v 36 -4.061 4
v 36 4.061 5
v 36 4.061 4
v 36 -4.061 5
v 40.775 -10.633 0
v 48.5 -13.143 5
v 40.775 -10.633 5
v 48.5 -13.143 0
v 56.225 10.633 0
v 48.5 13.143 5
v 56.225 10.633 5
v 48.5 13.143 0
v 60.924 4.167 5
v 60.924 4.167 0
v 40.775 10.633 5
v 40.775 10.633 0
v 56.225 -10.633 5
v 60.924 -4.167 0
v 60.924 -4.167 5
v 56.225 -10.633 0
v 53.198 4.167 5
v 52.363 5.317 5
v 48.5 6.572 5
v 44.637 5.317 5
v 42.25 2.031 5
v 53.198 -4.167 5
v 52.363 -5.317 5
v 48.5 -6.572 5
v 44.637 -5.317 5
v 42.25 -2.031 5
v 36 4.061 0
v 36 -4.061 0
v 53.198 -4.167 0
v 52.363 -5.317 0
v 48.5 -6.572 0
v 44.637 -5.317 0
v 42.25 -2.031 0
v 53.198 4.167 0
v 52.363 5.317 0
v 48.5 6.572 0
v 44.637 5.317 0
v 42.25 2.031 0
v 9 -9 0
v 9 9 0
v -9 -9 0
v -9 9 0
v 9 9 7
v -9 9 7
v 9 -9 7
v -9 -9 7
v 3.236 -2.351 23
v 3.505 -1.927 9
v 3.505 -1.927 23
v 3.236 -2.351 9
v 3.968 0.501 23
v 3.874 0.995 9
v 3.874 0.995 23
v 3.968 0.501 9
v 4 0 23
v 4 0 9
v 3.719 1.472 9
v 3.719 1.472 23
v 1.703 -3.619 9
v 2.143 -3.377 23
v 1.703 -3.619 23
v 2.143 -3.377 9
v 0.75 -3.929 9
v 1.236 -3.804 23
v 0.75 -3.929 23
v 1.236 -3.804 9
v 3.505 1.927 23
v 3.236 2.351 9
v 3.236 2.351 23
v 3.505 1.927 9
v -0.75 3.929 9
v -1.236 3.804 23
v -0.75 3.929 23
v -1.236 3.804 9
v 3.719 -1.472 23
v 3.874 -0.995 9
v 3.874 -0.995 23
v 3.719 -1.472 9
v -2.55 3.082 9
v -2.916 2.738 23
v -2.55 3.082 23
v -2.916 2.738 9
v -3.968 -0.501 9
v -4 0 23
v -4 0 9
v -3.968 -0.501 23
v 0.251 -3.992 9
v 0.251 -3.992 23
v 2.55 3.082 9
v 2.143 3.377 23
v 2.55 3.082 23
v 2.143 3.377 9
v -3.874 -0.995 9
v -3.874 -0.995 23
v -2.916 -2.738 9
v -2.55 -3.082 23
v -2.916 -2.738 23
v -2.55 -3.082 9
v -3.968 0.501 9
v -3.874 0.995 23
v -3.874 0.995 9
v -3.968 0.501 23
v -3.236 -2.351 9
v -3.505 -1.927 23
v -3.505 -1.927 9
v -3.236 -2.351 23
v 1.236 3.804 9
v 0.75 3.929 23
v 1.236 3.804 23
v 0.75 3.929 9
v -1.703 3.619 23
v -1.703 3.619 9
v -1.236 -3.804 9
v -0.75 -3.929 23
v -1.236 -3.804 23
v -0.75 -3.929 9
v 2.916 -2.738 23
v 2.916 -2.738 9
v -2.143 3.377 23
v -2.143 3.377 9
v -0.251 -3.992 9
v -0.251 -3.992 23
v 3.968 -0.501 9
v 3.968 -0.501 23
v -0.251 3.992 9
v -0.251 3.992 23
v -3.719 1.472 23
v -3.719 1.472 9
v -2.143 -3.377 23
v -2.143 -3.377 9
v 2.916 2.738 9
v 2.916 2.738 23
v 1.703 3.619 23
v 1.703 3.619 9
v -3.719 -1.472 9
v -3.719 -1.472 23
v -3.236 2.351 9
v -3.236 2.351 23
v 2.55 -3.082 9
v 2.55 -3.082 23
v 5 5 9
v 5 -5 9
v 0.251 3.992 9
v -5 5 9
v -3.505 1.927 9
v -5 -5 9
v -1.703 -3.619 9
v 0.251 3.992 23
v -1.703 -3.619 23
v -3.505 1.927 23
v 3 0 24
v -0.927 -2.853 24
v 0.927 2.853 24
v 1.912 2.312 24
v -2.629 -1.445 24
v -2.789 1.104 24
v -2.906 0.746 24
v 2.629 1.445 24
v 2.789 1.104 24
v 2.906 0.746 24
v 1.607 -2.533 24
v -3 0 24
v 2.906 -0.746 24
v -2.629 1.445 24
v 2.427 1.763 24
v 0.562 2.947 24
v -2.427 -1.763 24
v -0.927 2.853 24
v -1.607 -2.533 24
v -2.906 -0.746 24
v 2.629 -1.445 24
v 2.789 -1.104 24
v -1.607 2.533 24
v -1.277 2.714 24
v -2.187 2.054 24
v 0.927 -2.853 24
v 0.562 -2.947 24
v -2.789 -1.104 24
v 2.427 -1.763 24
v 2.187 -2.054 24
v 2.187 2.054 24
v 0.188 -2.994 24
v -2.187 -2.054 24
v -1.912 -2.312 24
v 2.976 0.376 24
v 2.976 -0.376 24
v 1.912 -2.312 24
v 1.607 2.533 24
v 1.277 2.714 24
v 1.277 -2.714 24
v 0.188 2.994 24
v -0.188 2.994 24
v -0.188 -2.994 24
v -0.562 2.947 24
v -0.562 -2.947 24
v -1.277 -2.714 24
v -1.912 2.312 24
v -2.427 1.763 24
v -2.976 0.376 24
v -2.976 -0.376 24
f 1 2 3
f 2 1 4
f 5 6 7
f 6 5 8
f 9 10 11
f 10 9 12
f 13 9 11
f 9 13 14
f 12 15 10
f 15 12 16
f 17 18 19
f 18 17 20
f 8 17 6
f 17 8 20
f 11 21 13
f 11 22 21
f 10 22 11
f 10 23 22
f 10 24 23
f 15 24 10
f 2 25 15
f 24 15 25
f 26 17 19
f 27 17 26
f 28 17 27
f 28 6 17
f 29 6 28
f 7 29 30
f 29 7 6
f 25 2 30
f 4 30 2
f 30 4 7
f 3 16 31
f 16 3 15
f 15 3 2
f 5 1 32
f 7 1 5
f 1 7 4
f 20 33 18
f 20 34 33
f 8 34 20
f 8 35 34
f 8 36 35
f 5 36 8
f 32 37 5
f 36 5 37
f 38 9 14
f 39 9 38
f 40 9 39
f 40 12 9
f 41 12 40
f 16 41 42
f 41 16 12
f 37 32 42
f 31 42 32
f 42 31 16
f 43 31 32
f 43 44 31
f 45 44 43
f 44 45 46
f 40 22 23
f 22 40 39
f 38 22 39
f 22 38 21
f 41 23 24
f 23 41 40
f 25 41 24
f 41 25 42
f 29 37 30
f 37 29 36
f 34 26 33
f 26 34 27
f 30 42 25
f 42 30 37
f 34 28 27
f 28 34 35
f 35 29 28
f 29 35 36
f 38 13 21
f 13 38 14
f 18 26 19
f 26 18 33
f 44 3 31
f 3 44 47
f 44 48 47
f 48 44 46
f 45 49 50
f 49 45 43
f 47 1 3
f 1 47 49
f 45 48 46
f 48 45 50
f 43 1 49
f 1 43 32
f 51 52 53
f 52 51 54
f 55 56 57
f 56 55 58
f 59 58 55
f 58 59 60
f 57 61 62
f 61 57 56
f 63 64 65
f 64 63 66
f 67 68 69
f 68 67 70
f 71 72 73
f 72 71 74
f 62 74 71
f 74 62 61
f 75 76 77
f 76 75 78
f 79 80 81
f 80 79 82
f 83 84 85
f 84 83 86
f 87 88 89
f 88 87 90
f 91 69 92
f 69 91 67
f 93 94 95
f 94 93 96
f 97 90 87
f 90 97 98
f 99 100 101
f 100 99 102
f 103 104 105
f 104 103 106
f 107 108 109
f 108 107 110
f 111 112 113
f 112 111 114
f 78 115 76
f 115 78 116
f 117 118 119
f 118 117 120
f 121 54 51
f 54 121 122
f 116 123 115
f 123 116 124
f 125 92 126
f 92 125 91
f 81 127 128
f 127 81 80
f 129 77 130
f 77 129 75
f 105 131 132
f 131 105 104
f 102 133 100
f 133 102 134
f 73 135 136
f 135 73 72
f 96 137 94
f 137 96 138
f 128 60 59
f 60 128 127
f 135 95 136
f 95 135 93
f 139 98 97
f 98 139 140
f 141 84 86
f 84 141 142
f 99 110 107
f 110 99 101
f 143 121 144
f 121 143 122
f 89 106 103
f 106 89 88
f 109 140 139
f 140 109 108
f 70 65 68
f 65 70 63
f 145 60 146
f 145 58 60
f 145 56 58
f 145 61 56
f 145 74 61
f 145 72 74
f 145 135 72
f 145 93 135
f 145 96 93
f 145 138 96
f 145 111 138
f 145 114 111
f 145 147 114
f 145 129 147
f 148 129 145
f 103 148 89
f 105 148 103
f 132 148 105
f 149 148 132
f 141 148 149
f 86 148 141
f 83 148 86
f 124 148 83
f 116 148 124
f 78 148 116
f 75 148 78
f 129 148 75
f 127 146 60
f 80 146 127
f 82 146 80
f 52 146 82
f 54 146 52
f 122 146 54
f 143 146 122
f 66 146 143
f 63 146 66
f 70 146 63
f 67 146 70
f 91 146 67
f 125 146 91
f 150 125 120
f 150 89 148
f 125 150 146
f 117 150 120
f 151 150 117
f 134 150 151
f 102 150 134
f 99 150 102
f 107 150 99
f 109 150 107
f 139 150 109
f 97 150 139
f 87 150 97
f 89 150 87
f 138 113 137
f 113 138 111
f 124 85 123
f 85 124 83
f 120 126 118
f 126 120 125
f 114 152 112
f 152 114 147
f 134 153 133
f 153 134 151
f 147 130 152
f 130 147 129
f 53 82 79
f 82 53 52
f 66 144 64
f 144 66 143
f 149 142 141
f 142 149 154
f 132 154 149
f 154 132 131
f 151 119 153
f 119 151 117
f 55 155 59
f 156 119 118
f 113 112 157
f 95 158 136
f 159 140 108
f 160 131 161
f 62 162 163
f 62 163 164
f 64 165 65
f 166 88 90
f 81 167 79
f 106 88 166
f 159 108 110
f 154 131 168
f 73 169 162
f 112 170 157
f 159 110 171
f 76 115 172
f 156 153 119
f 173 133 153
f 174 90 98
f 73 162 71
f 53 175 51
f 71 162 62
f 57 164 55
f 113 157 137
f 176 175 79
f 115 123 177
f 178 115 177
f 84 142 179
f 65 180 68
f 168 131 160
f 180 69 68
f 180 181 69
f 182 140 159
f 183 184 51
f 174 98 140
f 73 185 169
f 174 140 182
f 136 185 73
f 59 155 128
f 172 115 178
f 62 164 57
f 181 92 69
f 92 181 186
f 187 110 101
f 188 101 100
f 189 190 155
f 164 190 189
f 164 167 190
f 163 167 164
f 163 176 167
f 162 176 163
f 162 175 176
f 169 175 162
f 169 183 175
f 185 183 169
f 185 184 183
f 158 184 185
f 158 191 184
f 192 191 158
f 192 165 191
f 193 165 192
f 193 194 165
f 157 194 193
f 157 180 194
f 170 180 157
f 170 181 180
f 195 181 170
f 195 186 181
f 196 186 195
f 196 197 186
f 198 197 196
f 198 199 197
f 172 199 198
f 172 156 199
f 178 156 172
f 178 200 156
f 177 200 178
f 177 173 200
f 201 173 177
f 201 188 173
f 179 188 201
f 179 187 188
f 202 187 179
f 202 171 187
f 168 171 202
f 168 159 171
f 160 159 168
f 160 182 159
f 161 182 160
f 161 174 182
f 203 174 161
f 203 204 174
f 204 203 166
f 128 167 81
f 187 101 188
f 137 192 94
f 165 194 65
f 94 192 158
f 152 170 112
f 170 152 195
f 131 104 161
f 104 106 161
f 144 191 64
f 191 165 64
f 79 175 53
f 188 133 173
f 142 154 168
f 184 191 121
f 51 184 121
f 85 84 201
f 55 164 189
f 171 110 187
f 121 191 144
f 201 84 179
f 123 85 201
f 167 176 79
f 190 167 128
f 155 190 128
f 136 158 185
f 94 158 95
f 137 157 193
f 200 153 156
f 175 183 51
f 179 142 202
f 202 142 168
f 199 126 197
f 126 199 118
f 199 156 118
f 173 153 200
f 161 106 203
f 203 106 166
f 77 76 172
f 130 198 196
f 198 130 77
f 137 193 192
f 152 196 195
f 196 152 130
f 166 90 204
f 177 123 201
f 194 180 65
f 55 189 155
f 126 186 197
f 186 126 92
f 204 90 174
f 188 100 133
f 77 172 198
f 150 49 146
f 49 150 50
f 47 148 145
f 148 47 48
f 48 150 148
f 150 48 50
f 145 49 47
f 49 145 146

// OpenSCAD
///////////////////////////////////////////////////////////////////////////////////////////////
// arm customizer[OBLOBOTS] 
//////////////////////////////////////////////////////////////////////////////////////////////////
// (c) Jorge Medal (@oblomobka) - Sara Alvarellos (@trecedejunio) 2014-05 
//////////////////////////////////////////////////////////////////////////////////////////////////
// GPL license
//////////////////////////////////////////////////////////////////////////////////////////////////

/* [Parámetros del brazo] */

// Como quieres que esté construido el brazo del oblobot
TIPO_BRAZO="Rectas";		//[Rectas,Curvas]

Longitud_Brazo=70;		//[45:100]

Hombro=18;				//[18:Pequeño,22:Mediano,28:Grande]

Mano=25;					//[18:Pequeña,25:Mediana,32:Grande]

Tipo_Mano=4;				//[1,2,3,4]

/* [Parámetros de la unión] */

TIPO_UNION="Macho";		//[Hembra,Macho]

Diametro=8;				//[3:15]
Altura=15;				//[5:20]

/* [Hidden] */

Altura_brazo=7;
Altura_brazo_b=2;


if(TIPO_BRAZO=="Rectas"){
	if(TIPO_UNION=="Hembra"){
		arm_union_quadrangle(arm=[Hombro,Altura_brazo,Altura_brazo_b,Longitud_Brazo],hand=[Mano,Altura_brazo-2,2+Tipo_Mano*2],pin=[Diametro,20]);
		}
	else{
		union(){
			arm_quadrangle(arm=[Hombro,Altura_brazo,Longitud_Brazo],hand=[Mano,Altura_brazo-2,2+Tipo_Mano*2]);
			translate([0,0,Altura_brazo])
				pin_simple(pin=[Diametro,Altura],base=[Hombro,Diametro+2,Altura_brazo_b,4]);
			}
		}
	}

else{
	if(TIPO_UNION=="Hembra"){
		arm_union_cylindrical(arm=[Hombro,Altura_brazo,Altura_brazo_b,Longitud_Brazo],hand=[Mano,Altura_brazo-2,1+60*(Tipo_Mano-1)],pin=[Diametro,20]);
		}
	else{
		union(){
			arm_cylindrical(arm=[Hombro,Altura_brazo,Longitud_Brazo],hand=[Mano,Altura_brazo-2,1+60*(Tipo_Mano-1)]);
			translate([0,0,Altura_brazo])
				pin_simple(pin=[Diametro,Altura],base=[Hombro,Diametro+2,Altura_brazo_b,50]);
			}
		}
	}

	


// Limites


// ARMS | HANDS

	d_pin_minmax=[10,30];			//	d_pin=lim(d_pin_minmax[0],pin[0],d_pin_minmax[1]);			
	h_pin_minmax=[0,10];			//	h_pin=lim(h_pin_minmax[0],pin[1],h_pin_minmax[1]);

	// C
	d_arm_minmax=[10,40];			// 	d_arm=lim(d_arm_minmax[0],arm[0],d_arm_minmax[1]);
								//	d_arm=lim(d_pin+1,arm[0],d_arm_minmax[1]);	
	h_arm_minmax=[5,25];			// 	h_arm=lim(h_arm_minmax[0],arm[1],h_arm_minmax[1]);
	armpit_minmax=[0.3,60];		//	armpit=lim(armpit_minmax[0],arm[2],armpit_minmax[1]);
	l_arm_minmax=[20,120];		// 	l_arm=lim(d_arm+d_hand,arm[2],l_arm_minmax[1]);	

	d_hand_minmax=[10,60];		//	d_hand=lim(d_hand_minmax[0],hand[0],d_hand_minmax[1]);
	h_hand_minmax=[3,25];			//	h_hand=lim(h_hand_minmax[0],hand[1],h_arm-0.5);
	angle_hand_minmax=[0,180];	//	angle_hand=lim(angle_hand_minmax[0],hand[2]/2,angle_hand_minmax[1]);

	// Q
	x_arm_minmax=[5,25];			// 	x_arm=lim(x_arm_minmax[0],arm[1],x_arm_minmax[1]);
	y_arm_minmax=[10,40];			// 	y_arm=lim(y_arm_minmax[0],arm[0],y_arm_minmax[1]);
	z_arm_minmax=[20,120];		//	z_arm=lim(y_arm+5+d_hand,arm[2],z_arm_minmax[1]);

	n_hand_minmax=[4,12];			// 	n_hand=lim(n_hand_minmax[0],2*floor(hand[2]/2),n_hand_minmax[1]);
								//	h_hand=lim(h_hand_minmax[0],hand[1],x_arm-0.5);

// limita los posibles valores de x, que siempre estarán comprendidos entre un minimo(a) y un maximo(z)
function lim(a,x,z)=max(a,min(x,z));

//////////////////////////////////////////////////////////////////
///////////// MODULO arm_union_cylindrical()  ////////////////////

module arm_union_cylindrical (	arm=[18,10,1,65],					// [d,h,armpit,l]
								hand=[22,8,120],					// [d,h,ang]
								pin=[6,20],						//  
								play=0,
								resolution=50
								){

d_pin=lim(d_pin_minmax[0],pin[0],d_pin_minmax[1]);			// diámetro del pin
h_pin=lim(h_pin_minmax[0],pin[1],h_pin_minmax[1]);			// longitud del pin

d_arm=lim(d_pin+1,arm[0],d_arm_minmax[1]);					// medida del brazo: fondo	
h_arm=lim(h_arm_minmax[0],arm[1],h_arm_minmax[1]);			// medida del brazo: ancho
armpit=lim(armpit_minmax[0],arm[2],armpit_minmax[1]);		// medida de la axila

d_hand=lim(d_hand_minmax[0],hand[0],d_hand_minmax[1]);

l_arm=lim(d_arm+d_hand,arm[3],l_arm_minmax[1]);				// medida del brazo: longitud

difference(){
	union(){
		arm_cylindrical(arm=[d_arm,h_arm,l_arm],hand=hand);
		translate([0,0,h_arm])cylinder(r1=d_arm/2,r2=(d_pin+4)/2,h=armpit);
		}
	// Huecos hexagonales para introducir una espiga
	gap(gap=pin,deep=pin[1],play=play);
	translate([0,0,h_arm+armpit])rotate([180,0,0])
		gap(gap=pin,deep=pin[1],play=play);
	}
}

// -------------- Fin del módulo arm_union_cylindrical () -----------------
// ------------------------------------------------------------------------


//////////////////////////////////////////////////////////////////
///////////// MODULO arm_union_quadrangle()  ////////////////////

module arm_union_quadrangle (	arm=[18,10,2,65],			// [grosor(x),fondo(y),armpit,longitud(z)] Medidas de los Brazo
							hand=[22,8,8],			// [d,h,n lados]
							pin=[6,20],				
							play=0,
							resolution=50
							){

// valores con límites: acotados entre un máximo y un mínimo (los valores límite están en <limits_oblobots.scad>)
d_pin=lim(d_pin_minmax[0],pin[0],d_pin_minmax[1]);		// diámetro del pin
h_pin=lim(h_pin_minmax[0],pin[1],h_pin_minmax[1]);		// longitud del pin

x_arm=lim(x_arm_minmax[0],arm[1],x_arm_minmax[1]);				// medida del brazo: grosor
y_arm=lim(d_pin+1,arm[0],y_arm_minmax[1]);						// medida del brazo: fondo
armpit=lim(armpit_minmax[0],arm[2],armpit_minmax[1]);	// medida de la axila

d_hand=lim(d_hand_minmax[0],hand[0],d_hand_minmax[1]);
h_hand=lim(h_hand_minmax[0],hand[1],x_arm-0.5);
n_hand=lim(n_hand_minmax[0],2*floor(hand[2]/2),n_hand_minmax[1]);	// [4,6,8,10,12] nº de lados del polígono de la mano

z_arm=lim(y_arm+5+d_hand,arm[3],z_arm_minmax[1]);	// medida del brazo: longitud

// Volumen
difference(){
	union(){
		arm_quadrangle(arm=[y_arm,x_arm,z_arm],hand=hand);
		translate([0,0,x_arm])
			pyramid_circumscribed (d1=y_arm,d2=d_pin+3,h=armpit,n=4);
		}
	// Huecos hexagonales para introducir una espiga
	gap(gap=pin,deep=pin[1],play=play);
	translate([0,0,x_arm+armpit])rotate([180,0,0])
		gap(gap=pin,deep=pin[1],play=play);
	}
}


// -------------- Fin del módulo arm_union_quadrangle () -----------------
// ------------------------------------------------------------------------

//////////////////////////////////////////////////////////////////
///////////// MODULO arm_cylindrical()  //////////////////////////

module arm_cylindrical (	arm=[18,6,45],		// [d,h,l]
						hand=[27,4,120]		// [d,h,ang]
						){

// valores con límites: acotados entre un máximo y un mínimo (los valores límite están en <limits_oblobots.scad>)
d_arm=lim(d_arm_minmax[0],arm[0],d_arm_minmax[1]);			// medida del brazo: fondo
h_arm=lim(h_arm_minmax[0],arm[1],h_arm_minmax[1]);			// medida del brazo: ancho

d_hand=lim(d_hand_minmax[0],hand[0],d_hand_minmax[1]);
h_hand=lim(h_hand_minmax[0],hand[1],h_arm-0.5);
angle_hand=lim(angle_hand_minmax[0],hand[2]/2,angle_hand_minmax[1]);			//max(0,min(180,hand[2]/2));

l_arm=lim(d_arm+d_hand,arm[2],l_arm_minmax[1]);			// medida del brazo: longitud

// variables condicionadas a los valores de entrada
d_i_hand=d_hand/2;
d2_arm=d_arm-h_arm;
wrist=d_hand/3;
h_i_arm=h_arm/2;
l_i_arm=l_arm-d_arm/2-d_hand/2;

$fn=50;

// Volumen 
union(){
	difference(){
		union(){
			// brazo
			hull(){
				translate([0,0,h_arm-h_i_arm])
					cylinder(r=d_arm/2,h=h_i_arm);
				translate([0,0,0])
					cylinder(r=d2_arm/2,h=h_arm-h_i_arm);
				translate([l_i_arm-d_hand/2+wrist/2,0,0])
					cylinder(r=wrist/2,h=h_hand-1.5);
				}
			// mano
			translate([l_i_arm,0,0])
				cylinder(r1=d_hand/2,r2=(d_hand/2)*1,h=h_hand);
			}
			// hueco de la mano
			translate([l_i_arm,0,0])
				cylinder(r=d_i_hand/2,h=h_arm*2+2,center=true);
			// Garra
			for(i=[0,1]){
				mirror([0,i,0])		
					difference(){
						translate([l_i_arm,-0.01,-2])
							cube([d_hand,d_hand,2*h_arm-2]);
						translate([l_i_arm,0,-2])
							rotate([0,0,angle_hand])
								cube([d_hand,d_hand,2*h_arm-2]);
						}
				}
		}

	if(hand[2]>=180){
		for(i=[0,1]){
			mirror([0,i,0])
				translate([l_i_arm+d_hand/4,3*(d_hand-d_i_hand)/4,h_hand/2])
					cube([d_hand/2,(d_hand-d_i_hand)/2,h_hand],center=true);
			}
		}
	}
}

// -------------- Fin del módulo arm_cylindrical () -----------------------
// ------------------------------------------------------------------------


////////////////////////////////////////////////////////////////////////
/////////////////// MODULO arm_quadrangle()  ///////////////////////////

module arm_quadrangle (	arm=[10,15,70],		// [ grosor(x), fondo(y), longitud(z) ] Medidas de los Brazo
						hand=[20,5,8]
						){

x_arm=lim(x_arm_minmax[0],arm[1],x_arm_minmax[1]);					// medida del brazo: grosor
y_arm=lim(y_arm_minmax[0],arm[0],y_arm_minmax[1]);					// medida del brazo: fondo

d_hand=lim(d_hand_minmax[0],hand[0],d_hand_minmax[1]);
h_hand=lim(h_hand_minmax[0],hand[1],x_arm-0.5);
n_hand=lim(n_hand_minmax[0],2*floor(hand[2]/2),n_hand_minmax[1]);	// [4,6,8,10,12] nº de lados del polígono de la mano

z_arm=lim(y_arm+5+d_hand,arm[2],z_arm_minmax[1]);					// medida del brazo: longitud



//side=2*tan(180/tn)*td/2;		// medida del lado

wrist=2*(d_hand/2)*tan(180/max(6,n_hand));
h_wrist=h_hand-1;
z_i_arm=z_arm-(y_arm/2)-d_hand-(wrist/2);

translate([0,0,x_arm])
mirror([0,0,1])
union(){
	difference(){
		hull(){
			translate([0,0,x_arm/2])
				cube([y_arm,y_arm,x_arm],center=true);
			translate([z_i_arm,0,x_arm-h_wrist/2])
				cube([wrist,wrist,h_wrist],center=true);
			}
		// rebaje del hombro / forma poligonal
		//translate([0,0,x_arm/2+2])
			//prism_circumscribed (n=n_hand,d=2*y_arm/4,h=x_arm/2);
		}
	// Mano
	difference(){
		translate([z_i_arm+wrist/2+d_hand/2,0,x_arm-h_hand])
			prism_circumscribed (n=n_hand,d=d_hand,h=h_hand);
		translate([z_i_arm+wrist/2+d_hand/2,0,0])
			prism_circumscribed (n=n_hand,d=d_hand/2,h=x_arm*2);
		translate([z_i_arm+wrist/2+3*d_hand/4,0,x_arm])
			cube([d_hand/2+1,d_hand/3,2*x_arm],center=true);
		}
	}
}

// -------------- Fin del módulo arm_quadrangle() -------------------------------
// ------------------------------------------------------------------------------

module prism_circumscribed (	n=4,			// nº lados de la base del prisma
							d=20,		// diámetro del círculo donde se circunscribe el prisma
							h=10			// altura del prisma
							){
if(n%2==0){
	rotate([0,0,180/n])
		cylinder (r=d/2/cos(180/n), h=h, $fn=n);
	}
	else{
		rotate([0,0,90/n])
			cylinder (r=d/2/cos(180/n), h=h, $fn=n);
		}
}

module pyramid_circumscribed (	n=4,			// nº lados de la base de la pirámide	
								d1=20,		// diámetro del círculo-base donde se circunscribe la pirámide
								d2=0,		// diámetro del círculo-punta donde se circunscribe la pirámide
								h=10			// altura de la pirámide
								){
if(n%2==0){
	rotate([0,0,180/n])
		cylinder (r1=d1/2/cos(180/n), r2=d2/2/cos(180/n), h=h, $fn=n);
	}
	else{
		rotate([0,0,90/n])
			cylinder (r1=d1/2/cos(180/n), r2=d2/2/cos(180/n), h=h, $fn=n);
		}
}

module gap (gap=[6,20], deep=15, play=0){								
$fn=6;

h=gap[1];
d=gap[0]+0.25+play;

translate([0,0,-0.1])
	union(){
		pyramid_circumscribed (d1=d+2,d2=d,h=1,n=6);
		translate([0,0,0.9])
			prism_circumscribed (d=d,h=deep+0.1,n=6);
		}	
}

module pin_simple(	pin=[12,20],		// [d,h]	medidas generales del pin
					base=[0,0,0,0],			// [d1,d2,h,n] medidas y forma de la base. Opcional
					){
					
$fn=50;


dp=lim(4,pin[0],20);								// diámetro del pin
hp=lim(5,pin[1],30);								// longitud del pin
db1=lim(dp,base[0],100);							// diámetro de la base1
db2=lim(dp,base[1],db1);							// diámetro de la base2 si es =db1 es un prisma rectangular
hb=base[2];										// longitud de la base
nb=lim(4,base[3],50);								// lim:(4<-->50) nº de lados del prisma base	

hp1=1;											// rebaje de la punta
hp2=hp-hp1;

translate([0,0,hb])
	union(){
		cylinder(r=dp/2, h=hp2);
		translate([0,0,hp2])
			cylinder (r1=dp/2,r2=(dp-2)/2,h=hp1);
		if(hb==0){
				translate([0,0,-hb])
					pyramid_circumscribed(d1=db1,d2=db2,h=hb,n=0);
				}
			else{
				translate([0,0,-hb])
					pyramid_circumscribed(d1=db1,d2=db2,h=hb,n=nb);
				}
		}
}

